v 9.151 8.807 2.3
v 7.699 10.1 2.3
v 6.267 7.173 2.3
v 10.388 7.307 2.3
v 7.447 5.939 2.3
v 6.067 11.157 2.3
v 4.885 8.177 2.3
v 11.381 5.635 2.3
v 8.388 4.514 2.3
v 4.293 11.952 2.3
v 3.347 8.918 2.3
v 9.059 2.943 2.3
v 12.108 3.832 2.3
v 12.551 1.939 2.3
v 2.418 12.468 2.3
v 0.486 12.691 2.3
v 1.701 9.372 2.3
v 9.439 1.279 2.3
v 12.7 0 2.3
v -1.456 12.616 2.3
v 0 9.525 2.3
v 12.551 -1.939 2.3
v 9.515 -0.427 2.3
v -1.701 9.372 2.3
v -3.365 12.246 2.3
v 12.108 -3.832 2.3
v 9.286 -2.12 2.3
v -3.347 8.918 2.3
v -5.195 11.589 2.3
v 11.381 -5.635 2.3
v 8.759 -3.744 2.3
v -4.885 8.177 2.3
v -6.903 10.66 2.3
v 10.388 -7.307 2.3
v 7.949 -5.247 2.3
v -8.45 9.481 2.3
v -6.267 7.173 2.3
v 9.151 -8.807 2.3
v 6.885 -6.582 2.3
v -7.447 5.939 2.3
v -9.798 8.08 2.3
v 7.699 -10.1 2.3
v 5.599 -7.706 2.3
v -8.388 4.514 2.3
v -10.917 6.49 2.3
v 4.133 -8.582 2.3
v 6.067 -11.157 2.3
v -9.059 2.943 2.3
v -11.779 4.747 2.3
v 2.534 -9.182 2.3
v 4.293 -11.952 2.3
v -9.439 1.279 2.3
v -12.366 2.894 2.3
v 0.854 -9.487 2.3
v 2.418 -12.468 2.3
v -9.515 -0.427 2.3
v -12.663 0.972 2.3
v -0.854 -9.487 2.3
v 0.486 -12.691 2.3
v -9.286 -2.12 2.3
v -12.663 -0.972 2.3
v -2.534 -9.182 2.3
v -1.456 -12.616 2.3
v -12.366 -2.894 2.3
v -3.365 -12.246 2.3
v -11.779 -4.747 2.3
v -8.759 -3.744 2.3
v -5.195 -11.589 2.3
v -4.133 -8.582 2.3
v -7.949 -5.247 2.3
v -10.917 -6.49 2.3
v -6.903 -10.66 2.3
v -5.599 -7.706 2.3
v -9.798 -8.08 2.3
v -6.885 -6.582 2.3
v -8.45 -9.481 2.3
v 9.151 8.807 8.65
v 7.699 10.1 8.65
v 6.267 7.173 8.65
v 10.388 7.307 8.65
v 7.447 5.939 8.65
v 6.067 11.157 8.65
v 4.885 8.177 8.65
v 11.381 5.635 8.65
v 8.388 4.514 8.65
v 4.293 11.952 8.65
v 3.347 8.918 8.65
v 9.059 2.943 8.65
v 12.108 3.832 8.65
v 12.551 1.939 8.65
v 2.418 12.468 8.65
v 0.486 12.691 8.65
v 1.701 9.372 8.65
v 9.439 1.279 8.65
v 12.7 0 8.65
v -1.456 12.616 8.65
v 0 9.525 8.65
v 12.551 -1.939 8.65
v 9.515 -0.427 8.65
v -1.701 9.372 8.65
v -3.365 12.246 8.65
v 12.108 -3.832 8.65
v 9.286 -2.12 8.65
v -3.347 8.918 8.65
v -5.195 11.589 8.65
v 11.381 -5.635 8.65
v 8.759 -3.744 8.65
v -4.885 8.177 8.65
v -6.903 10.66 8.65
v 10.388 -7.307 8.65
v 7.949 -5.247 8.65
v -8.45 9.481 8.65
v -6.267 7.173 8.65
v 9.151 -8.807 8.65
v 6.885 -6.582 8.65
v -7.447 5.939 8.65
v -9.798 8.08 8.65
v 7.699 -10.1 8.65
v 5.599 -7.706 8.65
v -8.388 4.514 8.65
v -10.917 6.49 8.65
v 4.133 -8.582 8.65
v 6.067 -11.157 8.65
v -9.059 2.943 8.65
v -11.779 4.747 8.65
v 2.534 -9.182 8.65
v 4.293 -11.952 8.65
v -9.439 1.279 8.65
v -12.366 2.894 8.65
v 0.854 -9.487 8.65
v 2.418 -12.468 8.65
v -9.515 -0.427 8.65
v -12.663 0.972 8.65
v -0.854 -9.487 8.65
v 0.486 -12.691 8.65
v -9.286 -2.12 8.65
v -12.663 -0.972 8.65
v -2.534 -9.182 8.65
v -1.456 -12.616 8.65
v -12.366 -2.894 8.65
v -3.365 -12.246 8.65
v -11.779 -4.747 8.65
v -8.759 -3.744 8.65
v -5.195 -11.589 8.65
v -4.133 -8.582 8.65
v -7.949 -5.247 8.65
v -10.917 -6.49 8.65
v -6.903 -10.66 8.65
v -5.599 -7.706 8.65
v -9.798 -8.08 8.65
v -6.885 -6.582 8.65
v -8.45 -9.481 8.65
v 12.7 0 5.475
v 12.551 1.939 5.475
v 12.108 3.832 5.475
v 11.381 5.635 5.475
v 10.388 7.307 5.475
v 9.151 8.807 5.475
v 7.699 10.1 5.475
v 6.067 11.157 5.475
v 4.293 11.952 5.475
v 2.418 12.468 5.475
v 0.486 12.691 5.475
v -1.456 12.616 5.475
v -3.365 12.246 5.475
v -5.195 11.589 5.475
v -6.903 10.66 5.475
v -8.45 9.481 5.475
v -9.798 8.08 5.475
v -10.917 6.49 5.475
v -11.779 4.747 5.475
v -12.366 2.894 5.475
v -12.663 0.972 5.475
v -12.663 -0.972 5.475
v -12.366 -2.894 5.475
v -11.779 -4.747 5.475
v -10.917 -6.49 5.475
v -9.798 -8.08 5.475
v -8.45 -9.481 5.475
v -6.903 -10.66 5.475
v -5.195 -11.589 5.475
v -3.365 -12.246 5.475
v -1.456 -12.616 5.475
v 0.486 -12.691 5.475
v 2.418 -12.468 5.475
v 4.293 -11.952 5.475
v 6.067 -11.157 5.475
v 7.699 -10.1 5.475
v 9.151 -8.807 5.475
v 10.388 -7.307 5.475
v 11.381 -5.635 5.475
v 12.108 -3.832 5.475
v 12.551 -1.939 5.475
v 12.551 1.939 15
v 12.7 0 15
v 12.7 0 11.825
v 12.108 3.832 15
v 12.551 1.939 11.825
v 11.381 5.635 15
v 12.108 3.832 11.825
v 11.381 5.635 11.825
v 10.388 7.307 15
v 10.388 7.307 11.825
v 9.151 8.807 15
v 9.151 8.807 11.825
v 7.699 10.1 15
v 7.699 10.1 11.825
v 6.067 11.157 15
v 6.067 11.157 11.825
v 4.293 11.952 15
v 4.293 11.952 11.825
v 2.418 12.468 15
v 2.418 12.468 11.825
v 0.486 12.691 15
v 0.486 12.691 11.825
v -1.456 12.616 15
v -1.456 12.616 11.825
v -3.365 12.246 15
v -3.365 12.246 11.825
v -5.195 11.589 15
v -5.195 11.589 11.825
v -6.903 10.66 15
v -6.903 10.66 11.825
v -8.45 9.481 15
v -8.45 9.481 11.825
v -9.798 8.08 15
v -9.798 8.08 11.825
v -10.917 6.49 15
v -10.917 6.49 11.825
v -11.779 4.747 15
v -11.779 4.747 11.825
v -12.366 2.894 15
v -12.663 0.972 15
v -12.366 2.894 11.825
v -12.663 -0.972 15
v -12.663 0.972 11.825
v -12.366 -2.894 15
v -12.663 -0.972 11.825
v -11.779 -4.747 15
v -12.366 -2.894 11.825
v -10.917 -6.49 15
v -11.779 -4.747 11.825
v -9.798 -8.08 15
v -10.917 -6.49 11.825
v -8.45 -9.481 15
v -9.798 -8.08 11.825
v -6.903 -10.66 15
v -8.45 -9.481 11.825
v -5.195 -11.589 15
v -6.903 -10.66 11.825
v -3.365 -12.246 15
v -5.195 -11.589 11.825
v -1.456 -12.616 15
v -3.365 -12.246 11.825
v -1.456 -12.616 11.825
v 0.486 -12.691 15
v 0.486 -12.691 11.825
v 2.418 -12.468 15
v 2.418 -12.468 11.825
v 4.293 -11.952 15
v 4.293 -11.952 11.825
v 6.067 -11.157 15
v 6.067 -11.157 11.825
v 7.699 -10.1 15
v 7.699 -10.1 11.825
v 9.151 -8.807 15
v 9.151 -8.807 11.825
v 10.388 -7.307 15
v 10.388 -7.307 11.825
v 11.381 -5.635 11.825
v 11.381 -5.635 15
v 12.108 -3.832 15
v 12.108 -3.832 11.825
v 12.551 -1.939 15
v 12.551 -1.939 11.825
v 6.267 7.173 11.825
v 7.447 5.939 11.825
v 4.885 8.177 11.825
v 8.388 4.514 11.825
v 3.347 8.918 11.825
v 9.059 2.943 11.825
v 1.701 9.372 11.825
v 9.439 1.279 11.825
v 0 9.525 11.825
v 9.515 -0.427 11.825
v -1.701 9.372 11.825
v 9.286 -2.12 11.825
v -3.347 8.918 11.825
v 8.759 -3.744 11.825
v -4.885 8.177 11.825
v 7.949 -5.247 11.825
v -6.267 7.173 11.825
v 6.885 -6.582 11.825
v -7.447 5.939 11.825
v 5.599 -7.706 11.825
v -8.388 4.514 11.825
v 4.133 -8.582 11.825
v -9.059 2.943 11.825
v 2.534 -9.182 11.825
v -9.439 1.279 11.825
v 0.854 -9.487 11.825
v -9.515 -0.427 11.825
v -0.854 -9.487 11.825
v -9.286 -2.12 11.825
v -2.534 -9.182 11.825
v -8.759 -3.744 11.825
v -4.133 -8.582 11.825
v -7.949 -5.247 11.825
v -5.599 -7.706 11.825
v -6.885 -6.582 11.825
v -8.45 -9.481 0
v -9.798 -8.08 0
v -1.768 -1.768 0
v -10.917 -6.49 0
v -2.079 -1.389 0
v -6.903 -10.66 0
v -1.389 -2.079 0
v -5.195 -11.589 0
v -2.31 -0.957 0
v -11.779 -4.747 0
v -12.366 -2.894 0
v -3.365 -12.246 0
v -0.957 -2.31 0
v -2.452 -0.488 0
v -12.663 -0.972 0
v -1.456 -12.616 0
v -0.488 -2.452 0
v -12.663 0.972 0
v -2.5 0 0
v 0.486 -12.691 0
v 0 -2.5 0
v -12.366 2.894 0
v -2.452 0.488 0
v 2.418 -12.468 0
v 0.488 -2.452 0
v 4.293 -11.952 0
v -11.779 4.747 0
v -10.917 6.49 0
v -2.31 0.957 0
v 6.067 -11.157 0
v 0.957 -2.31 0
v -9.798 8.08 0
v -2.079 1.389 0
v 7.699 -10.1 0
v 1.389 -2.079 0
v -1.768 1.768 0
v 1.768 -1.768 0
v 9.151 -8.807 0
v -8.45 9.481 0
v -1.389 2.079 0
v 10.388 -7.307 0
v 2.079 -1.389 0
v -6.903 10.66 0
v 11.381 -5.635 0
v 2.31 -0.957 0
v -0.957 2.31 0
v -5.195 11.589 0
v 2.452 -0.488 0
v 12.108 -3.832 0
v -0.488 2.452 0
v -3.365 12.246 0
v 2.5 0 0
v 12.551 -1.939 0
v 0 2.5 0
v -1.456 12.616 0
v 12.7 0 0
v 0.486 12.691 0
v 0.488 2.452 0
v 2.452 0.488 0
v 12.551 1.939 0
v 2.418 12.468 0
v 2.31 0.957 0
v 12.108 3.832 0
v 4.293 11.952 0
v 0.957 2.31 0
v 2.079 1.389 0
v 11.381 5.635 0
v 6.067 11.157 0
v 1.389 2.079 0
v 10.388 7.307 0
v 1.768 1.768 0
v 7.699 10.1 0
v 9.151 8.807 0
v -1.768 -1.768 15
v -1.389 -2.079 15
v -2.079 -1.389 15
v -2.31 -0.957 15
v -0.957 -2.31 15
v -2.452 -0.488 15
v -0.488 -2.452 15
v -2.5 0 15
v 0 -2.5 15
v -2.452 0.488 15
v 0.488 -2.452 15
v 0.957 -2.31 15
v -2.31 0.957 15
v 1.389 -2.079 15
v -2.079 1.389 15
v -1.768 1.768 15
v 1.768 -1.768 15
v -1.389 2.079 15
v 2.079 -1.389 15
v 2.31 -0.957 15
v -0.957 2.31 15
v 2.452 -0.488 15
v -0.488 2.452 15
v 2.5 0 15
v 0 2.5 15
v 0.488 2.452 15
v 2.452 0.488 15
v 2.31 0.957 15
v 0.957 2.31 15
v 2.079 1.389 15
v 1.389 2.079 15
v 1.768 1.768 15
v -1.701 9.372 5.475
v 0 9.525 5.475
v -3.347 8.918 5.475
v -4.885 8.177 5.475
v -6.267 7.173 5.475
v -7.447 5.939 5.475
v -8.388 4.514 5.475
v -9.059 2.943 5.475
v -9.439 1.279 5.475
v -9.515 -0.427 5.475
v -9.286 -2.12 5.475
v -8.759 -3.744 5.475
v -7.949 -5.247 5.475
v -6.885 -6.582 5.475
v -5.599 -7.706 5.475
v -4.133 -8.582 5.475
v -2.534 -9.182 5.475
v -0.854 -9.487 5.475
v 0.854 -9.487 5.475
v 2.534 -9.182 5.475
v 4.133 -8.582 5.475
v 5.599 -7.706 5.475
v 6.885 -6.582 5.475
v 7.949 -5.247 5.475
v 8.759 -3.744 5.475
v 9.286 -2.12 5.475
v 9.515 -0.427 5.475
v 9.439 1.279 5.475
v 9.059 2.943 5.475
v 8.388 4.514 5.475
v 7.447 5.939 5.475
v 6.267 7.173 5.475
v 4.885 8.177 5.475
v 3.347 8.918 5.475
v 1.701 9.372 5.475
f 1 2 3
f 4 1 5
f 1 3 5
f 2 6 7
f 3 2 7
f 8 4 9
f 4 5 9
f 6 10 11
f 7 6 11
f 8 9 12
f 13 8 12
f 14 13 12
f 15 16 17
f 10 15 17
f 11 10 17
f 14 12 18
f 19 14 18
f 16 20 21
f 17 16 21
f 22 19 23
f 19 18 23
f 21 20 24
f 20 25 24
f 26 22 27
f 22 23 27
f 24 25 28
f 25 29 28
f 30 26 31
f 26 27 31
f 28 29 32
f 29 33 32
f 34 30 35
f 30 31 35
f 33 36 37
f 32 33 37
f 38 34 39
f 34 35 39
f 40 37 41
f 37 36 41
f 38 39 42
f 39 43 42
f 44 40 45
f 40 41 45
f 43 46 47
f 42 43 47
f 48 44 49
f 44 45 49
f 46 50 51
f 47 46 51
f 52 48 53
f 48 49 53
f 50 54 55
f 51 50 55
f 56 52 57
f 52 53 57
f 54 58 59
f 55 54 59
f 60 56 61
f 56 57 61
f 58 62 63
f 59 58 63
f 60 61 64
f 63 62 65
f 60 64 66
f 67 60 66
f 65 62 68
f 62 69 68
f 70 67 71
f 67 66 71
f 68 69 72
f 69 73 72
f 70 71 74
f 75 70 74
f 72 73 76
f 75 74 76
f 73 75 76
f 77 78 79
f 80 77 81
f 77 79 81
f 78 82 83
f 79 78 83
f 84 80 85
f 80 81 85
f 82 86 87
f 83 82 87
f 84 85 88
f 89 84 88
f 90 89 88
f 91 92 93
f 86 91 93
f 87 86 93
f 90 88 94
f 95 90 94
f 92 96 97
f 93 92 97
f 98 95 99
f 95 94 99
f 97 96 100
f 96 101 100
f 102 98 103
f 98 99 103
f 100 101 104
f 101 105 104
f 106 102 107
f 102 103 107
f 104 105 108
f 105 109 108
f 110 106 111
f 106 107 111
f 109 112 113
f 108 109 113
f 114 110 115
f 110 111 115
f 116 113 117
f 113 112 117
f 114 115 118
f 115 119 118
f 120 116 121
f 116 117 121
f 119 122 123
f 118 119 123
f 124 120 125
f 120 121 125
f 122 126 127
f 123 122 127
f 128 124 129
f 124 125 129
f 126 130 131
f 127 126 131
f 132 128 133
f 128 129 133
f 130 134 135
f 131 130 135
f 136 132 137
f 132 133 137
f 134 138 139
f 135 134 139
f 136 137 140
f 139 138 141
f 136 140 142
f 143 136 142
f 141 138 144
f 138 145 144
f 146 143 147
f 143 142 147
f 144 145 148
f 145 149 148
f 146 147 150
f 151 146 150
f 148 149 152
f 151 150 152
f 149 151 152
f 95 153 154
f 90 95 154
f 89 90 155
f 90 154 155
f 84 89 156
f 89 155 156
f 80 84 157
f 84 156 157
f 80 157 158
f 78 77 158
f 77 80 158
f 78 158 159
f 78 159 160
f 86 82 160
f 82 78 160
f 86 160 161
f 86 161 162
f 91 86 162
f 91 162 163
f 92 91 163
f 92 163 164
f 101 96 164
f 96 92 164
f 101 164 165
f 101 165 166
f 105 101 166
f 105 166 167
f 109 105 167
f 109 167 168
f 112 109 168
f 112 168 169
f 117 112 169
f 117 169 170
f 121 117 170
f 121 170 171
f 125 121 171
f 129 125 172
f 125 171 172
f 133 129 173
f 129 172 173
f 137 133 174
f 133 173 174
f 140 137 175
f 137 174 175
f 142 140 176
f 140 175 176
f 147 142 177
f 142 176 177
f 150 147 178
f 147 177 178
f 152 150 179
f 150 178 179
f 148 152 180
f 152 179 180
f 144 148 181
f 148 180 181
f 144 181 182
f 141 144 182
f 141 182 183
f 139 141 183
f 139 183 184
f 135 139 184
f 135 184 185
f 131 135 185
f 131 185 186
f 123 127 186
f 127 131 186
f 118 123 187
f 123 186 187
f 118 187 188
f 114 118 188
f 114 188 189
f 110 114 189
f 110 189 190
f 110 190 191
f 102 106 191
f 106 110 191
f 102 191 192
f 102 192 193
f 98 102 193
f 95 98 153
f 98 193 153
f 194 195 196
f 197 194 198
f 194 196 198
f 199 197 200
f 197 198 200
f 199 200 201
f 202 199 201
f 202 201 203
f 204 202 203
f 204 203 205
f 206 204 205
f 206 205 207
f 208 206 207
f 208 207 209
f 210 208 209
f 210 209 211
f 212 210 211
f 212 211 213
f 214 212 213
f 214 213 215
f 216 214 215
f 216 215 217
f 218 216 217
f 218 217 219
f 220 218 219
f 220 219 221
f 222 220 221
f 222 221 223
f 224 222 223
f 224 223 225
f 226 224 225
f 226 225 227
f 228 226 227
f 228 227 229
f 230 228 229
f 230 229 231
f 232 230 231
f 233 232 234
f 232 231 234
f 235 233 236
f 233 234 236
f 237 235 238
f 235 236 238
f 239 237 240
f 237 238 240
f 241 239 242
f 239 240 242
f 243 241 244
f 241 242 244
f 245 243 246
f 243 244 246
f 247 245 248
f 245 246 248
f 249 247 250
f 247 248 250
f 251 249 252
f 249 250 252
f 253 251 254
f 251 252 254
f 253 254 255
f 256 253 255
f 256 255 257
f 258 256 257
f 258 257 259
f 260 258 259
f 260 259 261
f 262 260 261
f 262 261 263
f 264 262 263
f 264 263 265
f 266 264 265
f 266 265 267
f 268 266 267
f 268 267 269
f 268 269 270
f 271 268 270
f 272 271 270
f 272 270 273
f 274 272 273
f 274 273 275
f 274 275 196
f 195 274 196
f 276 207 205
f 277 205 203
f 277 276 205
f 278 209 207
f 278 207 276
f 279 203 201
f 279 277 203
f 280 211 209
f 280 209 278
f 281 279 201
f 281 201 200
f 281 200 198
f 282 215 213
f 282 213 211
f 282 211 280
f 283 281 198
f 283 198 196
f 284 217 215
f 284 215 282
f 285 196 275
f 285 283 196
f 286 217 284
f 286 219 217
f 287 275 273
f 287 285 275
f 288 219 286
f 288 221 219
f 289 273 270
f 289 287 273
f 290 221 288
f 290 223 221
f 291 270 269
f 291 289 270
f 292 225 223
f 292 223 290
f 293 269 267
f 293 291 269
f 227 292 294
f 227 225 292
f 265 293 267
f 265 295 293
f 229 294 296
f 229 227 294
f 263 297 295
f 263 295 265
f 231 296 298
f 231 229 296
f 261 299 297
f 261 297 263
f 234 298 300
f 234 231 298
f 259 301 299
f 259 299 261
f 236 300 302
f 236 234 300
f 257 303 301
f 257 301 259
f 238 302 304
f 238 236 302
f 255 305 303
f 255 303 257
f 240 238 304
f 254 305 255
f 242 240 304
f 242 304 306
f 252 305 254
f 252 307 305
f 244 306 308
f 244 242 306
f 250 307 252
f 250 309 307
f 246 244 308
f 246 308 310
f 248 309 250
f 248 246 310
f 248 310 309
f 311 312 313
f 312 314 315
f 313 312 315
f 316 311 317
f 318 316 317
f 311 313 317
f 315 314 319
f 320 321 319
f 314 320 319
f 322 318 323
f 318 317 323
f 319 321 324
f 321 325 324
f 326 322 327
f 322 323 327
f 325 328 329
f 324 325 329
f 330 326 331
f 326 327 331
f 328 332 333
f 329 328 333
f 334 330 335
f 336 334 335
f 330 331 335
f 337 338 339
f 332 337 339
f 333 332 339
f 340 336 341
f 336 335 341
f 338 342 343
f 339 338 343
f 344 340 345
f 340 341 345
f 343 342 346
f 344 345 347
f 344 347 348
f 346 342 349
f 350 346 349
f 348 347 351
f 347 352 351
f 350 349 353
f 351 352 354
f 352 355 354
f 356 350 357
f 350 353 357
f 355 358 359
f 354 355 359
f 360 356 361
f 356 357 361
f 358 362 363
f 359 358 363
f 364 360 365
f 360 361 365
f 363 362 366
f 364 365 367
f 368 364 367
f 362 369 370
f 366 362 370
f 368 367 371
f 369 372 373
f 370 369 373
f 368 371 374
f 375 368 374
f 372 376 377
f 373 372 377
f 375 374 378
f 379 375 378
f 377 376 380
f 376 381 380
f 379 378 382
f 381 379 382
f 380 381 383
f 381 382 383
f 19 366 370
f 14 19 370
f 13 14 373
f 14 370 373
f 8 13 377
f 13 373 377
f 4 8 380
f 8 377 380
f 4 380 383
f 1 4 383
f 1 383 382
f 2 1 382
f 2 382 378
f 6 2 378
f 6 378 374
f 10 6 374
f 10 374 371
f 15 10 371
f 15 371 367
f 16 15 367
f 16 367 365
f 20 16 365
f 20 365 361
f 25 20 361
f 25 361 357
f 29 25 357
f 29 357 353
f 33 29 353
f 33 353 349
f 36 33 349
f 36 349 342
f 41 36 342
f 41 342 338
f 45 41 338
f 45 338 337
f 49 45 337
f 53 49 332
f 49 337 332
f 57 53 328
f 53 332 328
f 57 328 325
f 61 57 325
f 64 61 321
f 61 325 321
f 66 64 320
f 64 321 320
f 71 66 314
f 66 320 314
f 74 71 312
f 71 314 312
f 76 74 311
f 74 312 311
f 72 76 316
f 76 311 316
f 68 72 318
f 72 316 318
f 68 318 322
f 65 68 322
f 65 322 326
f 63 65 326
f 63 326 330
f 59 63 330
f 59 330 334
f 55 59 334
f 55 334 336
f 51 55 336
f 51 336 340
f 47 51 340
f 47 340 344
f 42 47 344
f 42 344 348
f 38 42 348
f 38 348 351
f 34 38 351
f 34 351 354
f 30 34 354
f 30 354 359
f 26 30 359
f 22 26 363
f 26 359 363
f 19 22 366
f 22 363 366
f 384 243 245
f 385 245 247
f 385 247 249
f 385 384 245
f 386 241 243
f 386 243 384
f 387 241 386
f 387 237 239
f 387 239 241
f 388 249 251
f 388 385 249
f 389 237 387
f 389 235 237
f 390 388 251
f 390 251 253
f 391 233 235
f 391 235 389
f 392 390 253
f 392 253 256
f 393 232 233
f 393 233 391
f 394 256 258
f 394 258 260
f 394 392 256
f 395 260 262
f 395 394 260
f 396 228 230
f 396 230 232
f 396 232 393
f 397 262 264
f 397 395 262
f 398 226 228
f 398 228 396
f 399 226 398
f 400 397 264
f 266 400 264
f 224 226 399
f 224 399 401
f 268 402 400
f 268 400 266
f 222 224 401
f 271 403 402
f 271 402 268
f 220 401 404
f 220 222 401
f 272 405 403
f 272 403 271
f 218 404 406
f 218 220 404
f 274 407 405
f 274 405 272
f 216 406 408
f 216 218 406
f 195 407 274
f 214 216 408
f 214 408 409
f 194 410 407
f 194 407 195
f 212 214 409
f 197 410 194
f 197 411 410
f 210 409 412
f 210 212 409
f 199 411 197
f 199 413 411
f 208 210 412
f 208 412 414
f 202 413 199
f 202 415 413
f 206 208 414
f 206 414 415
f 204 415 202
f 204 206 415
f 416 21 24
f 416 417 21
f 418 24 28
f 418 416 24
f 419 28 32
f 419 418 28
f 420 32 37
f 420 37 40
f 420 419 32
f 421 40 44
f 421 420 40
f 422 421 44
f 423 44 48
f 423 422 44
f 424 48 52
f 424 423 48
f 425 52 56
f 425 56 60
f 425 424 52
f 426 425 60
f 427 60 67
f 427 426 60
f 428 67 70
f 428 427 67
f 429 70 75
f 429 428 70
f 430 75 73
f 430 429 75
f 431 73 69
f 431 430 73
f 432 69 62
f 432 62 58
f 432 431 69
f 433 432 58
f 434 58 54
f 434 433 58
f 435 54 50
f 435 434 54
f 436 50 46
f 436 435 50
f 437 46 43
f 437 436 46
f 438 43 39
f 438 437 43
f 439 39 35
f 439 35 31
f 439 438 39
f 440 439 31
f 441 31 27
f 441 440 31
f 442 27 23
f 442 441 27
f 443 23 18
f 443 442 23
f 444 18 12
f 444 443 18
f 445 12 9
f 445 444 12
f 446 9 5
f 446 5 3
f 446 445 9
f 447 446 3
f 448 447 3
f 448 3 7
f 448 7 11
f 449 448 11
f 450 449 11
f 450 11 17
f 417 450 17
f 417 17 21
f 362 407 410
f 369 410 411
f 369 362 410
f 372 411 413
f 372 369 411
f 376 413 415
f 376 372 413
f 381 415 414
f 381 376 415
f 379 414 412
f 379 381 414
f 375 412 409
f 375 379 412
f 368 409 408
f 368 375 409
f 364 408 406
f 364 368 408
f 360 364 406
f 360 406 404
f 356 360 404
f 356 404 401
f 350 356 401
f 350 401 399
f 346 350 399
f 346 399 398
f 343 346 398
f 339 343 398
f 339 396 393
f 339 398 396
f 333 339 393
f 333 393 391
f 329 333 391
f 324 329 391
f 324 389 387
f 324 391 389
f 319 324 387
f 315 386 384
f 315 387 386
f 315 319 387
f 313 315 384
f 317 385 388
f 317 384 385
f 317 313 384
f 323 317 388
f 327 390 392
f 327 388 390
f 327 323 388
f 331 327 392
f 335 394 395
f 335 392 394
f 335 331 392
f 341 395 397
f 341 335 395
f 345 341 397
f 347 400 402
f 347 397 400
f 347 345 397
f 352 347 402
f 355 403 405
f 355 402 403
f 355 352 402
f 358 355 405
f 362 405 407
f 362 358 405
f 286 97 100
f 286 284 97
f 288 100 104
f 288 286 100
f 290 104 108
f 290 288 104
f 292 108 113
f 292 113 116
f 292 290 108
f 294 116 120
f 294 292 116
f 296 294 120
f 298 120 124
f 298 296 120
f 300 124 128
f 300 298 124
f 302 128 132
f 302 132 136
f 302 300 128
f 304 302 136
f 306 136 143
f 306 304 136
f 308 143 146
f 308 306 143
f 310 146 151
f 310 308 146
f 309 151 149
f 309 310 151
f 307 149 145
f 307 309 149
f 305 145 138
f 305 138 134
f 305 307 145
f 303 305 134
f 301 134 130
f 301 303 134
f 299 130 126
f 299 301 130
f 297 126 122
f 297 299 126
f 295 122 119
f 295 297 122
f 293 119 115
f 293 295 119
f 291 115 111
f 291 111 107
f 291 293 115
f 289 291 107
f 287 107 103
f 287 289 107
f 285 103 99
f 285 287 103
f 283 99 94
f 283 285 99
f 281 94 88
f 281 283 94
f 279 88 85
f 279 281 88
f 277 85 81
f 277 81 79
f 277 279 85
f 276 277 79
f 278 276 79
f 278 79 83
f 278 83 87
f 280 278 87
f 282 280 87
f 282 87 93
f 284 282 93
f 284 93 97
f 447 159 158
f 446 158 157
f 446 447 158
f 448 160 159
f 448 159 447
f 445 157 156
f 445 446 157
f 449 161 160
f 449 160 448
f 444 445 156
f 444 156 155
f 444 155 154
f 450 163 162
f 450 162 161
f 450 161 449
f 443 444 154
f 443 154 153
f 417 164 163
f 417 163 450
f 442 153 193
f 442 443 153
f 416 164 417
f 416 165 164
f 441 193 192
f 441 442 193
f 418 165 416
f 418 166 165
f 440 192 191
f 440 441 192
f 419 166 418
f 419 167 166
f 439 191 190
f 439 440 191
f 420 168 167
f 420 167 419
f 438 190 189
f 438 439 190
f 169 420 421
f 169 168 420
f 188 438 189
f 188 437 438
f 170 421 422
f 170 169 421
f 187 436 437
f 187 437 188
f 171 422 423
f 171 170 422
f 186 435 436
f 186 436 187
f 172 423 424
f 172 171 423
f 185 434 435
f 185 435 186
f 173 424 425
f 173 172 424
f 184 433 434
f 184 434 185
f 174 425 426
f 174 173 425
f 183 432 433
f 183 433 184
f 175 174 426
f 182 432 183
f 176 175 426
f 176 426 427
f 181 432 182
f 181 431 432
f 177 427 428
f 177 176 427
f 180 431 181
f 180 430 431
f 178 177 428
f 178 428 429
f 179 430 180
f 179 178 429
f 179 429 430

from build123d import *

# Parameters (mm, degrees)
F0_R     = 12.7
F0_R_2   = 9.525
F1_DEPTH = 15
F3_W     = 3.175
F3_H     = 3.175
F5_R     = 2.5
F6_DEPTH = 25.4


with BuildPart() as f1:
    # F0 (on Top) → F1 (new body)
    with BuildSketch(Plane.XY):
        Circle(F0_R)
        Circle(F0_R_2, mode=Mode.SUBTRACT)
        Circle(F0_R_2)
    extrude(amount=F1_DEPTH)

    # F3 (on Right) → F4 (revolve, cut)
    with BuildSketch(Plane.YZ):
        with Locations((11.1125, 3.8875)):
            Rectangle(F3_W, F3_H)
        with Locations((11.1125, 10.2375)):
            Rectangle(F3_W, F3_H)
    revolve(axis=Axis((0, 0, -0.284396), (0, 0, 1)), mode=Mode.SUBTRACT)

    # F5 (on face) → F6 (cut)
    with BuildSketch(Plane.XY):
        Circle(F5_R)
    extrude(amount=F6_DEPTH, mode=Mode.SUBTRACT)


solid = f1.part
